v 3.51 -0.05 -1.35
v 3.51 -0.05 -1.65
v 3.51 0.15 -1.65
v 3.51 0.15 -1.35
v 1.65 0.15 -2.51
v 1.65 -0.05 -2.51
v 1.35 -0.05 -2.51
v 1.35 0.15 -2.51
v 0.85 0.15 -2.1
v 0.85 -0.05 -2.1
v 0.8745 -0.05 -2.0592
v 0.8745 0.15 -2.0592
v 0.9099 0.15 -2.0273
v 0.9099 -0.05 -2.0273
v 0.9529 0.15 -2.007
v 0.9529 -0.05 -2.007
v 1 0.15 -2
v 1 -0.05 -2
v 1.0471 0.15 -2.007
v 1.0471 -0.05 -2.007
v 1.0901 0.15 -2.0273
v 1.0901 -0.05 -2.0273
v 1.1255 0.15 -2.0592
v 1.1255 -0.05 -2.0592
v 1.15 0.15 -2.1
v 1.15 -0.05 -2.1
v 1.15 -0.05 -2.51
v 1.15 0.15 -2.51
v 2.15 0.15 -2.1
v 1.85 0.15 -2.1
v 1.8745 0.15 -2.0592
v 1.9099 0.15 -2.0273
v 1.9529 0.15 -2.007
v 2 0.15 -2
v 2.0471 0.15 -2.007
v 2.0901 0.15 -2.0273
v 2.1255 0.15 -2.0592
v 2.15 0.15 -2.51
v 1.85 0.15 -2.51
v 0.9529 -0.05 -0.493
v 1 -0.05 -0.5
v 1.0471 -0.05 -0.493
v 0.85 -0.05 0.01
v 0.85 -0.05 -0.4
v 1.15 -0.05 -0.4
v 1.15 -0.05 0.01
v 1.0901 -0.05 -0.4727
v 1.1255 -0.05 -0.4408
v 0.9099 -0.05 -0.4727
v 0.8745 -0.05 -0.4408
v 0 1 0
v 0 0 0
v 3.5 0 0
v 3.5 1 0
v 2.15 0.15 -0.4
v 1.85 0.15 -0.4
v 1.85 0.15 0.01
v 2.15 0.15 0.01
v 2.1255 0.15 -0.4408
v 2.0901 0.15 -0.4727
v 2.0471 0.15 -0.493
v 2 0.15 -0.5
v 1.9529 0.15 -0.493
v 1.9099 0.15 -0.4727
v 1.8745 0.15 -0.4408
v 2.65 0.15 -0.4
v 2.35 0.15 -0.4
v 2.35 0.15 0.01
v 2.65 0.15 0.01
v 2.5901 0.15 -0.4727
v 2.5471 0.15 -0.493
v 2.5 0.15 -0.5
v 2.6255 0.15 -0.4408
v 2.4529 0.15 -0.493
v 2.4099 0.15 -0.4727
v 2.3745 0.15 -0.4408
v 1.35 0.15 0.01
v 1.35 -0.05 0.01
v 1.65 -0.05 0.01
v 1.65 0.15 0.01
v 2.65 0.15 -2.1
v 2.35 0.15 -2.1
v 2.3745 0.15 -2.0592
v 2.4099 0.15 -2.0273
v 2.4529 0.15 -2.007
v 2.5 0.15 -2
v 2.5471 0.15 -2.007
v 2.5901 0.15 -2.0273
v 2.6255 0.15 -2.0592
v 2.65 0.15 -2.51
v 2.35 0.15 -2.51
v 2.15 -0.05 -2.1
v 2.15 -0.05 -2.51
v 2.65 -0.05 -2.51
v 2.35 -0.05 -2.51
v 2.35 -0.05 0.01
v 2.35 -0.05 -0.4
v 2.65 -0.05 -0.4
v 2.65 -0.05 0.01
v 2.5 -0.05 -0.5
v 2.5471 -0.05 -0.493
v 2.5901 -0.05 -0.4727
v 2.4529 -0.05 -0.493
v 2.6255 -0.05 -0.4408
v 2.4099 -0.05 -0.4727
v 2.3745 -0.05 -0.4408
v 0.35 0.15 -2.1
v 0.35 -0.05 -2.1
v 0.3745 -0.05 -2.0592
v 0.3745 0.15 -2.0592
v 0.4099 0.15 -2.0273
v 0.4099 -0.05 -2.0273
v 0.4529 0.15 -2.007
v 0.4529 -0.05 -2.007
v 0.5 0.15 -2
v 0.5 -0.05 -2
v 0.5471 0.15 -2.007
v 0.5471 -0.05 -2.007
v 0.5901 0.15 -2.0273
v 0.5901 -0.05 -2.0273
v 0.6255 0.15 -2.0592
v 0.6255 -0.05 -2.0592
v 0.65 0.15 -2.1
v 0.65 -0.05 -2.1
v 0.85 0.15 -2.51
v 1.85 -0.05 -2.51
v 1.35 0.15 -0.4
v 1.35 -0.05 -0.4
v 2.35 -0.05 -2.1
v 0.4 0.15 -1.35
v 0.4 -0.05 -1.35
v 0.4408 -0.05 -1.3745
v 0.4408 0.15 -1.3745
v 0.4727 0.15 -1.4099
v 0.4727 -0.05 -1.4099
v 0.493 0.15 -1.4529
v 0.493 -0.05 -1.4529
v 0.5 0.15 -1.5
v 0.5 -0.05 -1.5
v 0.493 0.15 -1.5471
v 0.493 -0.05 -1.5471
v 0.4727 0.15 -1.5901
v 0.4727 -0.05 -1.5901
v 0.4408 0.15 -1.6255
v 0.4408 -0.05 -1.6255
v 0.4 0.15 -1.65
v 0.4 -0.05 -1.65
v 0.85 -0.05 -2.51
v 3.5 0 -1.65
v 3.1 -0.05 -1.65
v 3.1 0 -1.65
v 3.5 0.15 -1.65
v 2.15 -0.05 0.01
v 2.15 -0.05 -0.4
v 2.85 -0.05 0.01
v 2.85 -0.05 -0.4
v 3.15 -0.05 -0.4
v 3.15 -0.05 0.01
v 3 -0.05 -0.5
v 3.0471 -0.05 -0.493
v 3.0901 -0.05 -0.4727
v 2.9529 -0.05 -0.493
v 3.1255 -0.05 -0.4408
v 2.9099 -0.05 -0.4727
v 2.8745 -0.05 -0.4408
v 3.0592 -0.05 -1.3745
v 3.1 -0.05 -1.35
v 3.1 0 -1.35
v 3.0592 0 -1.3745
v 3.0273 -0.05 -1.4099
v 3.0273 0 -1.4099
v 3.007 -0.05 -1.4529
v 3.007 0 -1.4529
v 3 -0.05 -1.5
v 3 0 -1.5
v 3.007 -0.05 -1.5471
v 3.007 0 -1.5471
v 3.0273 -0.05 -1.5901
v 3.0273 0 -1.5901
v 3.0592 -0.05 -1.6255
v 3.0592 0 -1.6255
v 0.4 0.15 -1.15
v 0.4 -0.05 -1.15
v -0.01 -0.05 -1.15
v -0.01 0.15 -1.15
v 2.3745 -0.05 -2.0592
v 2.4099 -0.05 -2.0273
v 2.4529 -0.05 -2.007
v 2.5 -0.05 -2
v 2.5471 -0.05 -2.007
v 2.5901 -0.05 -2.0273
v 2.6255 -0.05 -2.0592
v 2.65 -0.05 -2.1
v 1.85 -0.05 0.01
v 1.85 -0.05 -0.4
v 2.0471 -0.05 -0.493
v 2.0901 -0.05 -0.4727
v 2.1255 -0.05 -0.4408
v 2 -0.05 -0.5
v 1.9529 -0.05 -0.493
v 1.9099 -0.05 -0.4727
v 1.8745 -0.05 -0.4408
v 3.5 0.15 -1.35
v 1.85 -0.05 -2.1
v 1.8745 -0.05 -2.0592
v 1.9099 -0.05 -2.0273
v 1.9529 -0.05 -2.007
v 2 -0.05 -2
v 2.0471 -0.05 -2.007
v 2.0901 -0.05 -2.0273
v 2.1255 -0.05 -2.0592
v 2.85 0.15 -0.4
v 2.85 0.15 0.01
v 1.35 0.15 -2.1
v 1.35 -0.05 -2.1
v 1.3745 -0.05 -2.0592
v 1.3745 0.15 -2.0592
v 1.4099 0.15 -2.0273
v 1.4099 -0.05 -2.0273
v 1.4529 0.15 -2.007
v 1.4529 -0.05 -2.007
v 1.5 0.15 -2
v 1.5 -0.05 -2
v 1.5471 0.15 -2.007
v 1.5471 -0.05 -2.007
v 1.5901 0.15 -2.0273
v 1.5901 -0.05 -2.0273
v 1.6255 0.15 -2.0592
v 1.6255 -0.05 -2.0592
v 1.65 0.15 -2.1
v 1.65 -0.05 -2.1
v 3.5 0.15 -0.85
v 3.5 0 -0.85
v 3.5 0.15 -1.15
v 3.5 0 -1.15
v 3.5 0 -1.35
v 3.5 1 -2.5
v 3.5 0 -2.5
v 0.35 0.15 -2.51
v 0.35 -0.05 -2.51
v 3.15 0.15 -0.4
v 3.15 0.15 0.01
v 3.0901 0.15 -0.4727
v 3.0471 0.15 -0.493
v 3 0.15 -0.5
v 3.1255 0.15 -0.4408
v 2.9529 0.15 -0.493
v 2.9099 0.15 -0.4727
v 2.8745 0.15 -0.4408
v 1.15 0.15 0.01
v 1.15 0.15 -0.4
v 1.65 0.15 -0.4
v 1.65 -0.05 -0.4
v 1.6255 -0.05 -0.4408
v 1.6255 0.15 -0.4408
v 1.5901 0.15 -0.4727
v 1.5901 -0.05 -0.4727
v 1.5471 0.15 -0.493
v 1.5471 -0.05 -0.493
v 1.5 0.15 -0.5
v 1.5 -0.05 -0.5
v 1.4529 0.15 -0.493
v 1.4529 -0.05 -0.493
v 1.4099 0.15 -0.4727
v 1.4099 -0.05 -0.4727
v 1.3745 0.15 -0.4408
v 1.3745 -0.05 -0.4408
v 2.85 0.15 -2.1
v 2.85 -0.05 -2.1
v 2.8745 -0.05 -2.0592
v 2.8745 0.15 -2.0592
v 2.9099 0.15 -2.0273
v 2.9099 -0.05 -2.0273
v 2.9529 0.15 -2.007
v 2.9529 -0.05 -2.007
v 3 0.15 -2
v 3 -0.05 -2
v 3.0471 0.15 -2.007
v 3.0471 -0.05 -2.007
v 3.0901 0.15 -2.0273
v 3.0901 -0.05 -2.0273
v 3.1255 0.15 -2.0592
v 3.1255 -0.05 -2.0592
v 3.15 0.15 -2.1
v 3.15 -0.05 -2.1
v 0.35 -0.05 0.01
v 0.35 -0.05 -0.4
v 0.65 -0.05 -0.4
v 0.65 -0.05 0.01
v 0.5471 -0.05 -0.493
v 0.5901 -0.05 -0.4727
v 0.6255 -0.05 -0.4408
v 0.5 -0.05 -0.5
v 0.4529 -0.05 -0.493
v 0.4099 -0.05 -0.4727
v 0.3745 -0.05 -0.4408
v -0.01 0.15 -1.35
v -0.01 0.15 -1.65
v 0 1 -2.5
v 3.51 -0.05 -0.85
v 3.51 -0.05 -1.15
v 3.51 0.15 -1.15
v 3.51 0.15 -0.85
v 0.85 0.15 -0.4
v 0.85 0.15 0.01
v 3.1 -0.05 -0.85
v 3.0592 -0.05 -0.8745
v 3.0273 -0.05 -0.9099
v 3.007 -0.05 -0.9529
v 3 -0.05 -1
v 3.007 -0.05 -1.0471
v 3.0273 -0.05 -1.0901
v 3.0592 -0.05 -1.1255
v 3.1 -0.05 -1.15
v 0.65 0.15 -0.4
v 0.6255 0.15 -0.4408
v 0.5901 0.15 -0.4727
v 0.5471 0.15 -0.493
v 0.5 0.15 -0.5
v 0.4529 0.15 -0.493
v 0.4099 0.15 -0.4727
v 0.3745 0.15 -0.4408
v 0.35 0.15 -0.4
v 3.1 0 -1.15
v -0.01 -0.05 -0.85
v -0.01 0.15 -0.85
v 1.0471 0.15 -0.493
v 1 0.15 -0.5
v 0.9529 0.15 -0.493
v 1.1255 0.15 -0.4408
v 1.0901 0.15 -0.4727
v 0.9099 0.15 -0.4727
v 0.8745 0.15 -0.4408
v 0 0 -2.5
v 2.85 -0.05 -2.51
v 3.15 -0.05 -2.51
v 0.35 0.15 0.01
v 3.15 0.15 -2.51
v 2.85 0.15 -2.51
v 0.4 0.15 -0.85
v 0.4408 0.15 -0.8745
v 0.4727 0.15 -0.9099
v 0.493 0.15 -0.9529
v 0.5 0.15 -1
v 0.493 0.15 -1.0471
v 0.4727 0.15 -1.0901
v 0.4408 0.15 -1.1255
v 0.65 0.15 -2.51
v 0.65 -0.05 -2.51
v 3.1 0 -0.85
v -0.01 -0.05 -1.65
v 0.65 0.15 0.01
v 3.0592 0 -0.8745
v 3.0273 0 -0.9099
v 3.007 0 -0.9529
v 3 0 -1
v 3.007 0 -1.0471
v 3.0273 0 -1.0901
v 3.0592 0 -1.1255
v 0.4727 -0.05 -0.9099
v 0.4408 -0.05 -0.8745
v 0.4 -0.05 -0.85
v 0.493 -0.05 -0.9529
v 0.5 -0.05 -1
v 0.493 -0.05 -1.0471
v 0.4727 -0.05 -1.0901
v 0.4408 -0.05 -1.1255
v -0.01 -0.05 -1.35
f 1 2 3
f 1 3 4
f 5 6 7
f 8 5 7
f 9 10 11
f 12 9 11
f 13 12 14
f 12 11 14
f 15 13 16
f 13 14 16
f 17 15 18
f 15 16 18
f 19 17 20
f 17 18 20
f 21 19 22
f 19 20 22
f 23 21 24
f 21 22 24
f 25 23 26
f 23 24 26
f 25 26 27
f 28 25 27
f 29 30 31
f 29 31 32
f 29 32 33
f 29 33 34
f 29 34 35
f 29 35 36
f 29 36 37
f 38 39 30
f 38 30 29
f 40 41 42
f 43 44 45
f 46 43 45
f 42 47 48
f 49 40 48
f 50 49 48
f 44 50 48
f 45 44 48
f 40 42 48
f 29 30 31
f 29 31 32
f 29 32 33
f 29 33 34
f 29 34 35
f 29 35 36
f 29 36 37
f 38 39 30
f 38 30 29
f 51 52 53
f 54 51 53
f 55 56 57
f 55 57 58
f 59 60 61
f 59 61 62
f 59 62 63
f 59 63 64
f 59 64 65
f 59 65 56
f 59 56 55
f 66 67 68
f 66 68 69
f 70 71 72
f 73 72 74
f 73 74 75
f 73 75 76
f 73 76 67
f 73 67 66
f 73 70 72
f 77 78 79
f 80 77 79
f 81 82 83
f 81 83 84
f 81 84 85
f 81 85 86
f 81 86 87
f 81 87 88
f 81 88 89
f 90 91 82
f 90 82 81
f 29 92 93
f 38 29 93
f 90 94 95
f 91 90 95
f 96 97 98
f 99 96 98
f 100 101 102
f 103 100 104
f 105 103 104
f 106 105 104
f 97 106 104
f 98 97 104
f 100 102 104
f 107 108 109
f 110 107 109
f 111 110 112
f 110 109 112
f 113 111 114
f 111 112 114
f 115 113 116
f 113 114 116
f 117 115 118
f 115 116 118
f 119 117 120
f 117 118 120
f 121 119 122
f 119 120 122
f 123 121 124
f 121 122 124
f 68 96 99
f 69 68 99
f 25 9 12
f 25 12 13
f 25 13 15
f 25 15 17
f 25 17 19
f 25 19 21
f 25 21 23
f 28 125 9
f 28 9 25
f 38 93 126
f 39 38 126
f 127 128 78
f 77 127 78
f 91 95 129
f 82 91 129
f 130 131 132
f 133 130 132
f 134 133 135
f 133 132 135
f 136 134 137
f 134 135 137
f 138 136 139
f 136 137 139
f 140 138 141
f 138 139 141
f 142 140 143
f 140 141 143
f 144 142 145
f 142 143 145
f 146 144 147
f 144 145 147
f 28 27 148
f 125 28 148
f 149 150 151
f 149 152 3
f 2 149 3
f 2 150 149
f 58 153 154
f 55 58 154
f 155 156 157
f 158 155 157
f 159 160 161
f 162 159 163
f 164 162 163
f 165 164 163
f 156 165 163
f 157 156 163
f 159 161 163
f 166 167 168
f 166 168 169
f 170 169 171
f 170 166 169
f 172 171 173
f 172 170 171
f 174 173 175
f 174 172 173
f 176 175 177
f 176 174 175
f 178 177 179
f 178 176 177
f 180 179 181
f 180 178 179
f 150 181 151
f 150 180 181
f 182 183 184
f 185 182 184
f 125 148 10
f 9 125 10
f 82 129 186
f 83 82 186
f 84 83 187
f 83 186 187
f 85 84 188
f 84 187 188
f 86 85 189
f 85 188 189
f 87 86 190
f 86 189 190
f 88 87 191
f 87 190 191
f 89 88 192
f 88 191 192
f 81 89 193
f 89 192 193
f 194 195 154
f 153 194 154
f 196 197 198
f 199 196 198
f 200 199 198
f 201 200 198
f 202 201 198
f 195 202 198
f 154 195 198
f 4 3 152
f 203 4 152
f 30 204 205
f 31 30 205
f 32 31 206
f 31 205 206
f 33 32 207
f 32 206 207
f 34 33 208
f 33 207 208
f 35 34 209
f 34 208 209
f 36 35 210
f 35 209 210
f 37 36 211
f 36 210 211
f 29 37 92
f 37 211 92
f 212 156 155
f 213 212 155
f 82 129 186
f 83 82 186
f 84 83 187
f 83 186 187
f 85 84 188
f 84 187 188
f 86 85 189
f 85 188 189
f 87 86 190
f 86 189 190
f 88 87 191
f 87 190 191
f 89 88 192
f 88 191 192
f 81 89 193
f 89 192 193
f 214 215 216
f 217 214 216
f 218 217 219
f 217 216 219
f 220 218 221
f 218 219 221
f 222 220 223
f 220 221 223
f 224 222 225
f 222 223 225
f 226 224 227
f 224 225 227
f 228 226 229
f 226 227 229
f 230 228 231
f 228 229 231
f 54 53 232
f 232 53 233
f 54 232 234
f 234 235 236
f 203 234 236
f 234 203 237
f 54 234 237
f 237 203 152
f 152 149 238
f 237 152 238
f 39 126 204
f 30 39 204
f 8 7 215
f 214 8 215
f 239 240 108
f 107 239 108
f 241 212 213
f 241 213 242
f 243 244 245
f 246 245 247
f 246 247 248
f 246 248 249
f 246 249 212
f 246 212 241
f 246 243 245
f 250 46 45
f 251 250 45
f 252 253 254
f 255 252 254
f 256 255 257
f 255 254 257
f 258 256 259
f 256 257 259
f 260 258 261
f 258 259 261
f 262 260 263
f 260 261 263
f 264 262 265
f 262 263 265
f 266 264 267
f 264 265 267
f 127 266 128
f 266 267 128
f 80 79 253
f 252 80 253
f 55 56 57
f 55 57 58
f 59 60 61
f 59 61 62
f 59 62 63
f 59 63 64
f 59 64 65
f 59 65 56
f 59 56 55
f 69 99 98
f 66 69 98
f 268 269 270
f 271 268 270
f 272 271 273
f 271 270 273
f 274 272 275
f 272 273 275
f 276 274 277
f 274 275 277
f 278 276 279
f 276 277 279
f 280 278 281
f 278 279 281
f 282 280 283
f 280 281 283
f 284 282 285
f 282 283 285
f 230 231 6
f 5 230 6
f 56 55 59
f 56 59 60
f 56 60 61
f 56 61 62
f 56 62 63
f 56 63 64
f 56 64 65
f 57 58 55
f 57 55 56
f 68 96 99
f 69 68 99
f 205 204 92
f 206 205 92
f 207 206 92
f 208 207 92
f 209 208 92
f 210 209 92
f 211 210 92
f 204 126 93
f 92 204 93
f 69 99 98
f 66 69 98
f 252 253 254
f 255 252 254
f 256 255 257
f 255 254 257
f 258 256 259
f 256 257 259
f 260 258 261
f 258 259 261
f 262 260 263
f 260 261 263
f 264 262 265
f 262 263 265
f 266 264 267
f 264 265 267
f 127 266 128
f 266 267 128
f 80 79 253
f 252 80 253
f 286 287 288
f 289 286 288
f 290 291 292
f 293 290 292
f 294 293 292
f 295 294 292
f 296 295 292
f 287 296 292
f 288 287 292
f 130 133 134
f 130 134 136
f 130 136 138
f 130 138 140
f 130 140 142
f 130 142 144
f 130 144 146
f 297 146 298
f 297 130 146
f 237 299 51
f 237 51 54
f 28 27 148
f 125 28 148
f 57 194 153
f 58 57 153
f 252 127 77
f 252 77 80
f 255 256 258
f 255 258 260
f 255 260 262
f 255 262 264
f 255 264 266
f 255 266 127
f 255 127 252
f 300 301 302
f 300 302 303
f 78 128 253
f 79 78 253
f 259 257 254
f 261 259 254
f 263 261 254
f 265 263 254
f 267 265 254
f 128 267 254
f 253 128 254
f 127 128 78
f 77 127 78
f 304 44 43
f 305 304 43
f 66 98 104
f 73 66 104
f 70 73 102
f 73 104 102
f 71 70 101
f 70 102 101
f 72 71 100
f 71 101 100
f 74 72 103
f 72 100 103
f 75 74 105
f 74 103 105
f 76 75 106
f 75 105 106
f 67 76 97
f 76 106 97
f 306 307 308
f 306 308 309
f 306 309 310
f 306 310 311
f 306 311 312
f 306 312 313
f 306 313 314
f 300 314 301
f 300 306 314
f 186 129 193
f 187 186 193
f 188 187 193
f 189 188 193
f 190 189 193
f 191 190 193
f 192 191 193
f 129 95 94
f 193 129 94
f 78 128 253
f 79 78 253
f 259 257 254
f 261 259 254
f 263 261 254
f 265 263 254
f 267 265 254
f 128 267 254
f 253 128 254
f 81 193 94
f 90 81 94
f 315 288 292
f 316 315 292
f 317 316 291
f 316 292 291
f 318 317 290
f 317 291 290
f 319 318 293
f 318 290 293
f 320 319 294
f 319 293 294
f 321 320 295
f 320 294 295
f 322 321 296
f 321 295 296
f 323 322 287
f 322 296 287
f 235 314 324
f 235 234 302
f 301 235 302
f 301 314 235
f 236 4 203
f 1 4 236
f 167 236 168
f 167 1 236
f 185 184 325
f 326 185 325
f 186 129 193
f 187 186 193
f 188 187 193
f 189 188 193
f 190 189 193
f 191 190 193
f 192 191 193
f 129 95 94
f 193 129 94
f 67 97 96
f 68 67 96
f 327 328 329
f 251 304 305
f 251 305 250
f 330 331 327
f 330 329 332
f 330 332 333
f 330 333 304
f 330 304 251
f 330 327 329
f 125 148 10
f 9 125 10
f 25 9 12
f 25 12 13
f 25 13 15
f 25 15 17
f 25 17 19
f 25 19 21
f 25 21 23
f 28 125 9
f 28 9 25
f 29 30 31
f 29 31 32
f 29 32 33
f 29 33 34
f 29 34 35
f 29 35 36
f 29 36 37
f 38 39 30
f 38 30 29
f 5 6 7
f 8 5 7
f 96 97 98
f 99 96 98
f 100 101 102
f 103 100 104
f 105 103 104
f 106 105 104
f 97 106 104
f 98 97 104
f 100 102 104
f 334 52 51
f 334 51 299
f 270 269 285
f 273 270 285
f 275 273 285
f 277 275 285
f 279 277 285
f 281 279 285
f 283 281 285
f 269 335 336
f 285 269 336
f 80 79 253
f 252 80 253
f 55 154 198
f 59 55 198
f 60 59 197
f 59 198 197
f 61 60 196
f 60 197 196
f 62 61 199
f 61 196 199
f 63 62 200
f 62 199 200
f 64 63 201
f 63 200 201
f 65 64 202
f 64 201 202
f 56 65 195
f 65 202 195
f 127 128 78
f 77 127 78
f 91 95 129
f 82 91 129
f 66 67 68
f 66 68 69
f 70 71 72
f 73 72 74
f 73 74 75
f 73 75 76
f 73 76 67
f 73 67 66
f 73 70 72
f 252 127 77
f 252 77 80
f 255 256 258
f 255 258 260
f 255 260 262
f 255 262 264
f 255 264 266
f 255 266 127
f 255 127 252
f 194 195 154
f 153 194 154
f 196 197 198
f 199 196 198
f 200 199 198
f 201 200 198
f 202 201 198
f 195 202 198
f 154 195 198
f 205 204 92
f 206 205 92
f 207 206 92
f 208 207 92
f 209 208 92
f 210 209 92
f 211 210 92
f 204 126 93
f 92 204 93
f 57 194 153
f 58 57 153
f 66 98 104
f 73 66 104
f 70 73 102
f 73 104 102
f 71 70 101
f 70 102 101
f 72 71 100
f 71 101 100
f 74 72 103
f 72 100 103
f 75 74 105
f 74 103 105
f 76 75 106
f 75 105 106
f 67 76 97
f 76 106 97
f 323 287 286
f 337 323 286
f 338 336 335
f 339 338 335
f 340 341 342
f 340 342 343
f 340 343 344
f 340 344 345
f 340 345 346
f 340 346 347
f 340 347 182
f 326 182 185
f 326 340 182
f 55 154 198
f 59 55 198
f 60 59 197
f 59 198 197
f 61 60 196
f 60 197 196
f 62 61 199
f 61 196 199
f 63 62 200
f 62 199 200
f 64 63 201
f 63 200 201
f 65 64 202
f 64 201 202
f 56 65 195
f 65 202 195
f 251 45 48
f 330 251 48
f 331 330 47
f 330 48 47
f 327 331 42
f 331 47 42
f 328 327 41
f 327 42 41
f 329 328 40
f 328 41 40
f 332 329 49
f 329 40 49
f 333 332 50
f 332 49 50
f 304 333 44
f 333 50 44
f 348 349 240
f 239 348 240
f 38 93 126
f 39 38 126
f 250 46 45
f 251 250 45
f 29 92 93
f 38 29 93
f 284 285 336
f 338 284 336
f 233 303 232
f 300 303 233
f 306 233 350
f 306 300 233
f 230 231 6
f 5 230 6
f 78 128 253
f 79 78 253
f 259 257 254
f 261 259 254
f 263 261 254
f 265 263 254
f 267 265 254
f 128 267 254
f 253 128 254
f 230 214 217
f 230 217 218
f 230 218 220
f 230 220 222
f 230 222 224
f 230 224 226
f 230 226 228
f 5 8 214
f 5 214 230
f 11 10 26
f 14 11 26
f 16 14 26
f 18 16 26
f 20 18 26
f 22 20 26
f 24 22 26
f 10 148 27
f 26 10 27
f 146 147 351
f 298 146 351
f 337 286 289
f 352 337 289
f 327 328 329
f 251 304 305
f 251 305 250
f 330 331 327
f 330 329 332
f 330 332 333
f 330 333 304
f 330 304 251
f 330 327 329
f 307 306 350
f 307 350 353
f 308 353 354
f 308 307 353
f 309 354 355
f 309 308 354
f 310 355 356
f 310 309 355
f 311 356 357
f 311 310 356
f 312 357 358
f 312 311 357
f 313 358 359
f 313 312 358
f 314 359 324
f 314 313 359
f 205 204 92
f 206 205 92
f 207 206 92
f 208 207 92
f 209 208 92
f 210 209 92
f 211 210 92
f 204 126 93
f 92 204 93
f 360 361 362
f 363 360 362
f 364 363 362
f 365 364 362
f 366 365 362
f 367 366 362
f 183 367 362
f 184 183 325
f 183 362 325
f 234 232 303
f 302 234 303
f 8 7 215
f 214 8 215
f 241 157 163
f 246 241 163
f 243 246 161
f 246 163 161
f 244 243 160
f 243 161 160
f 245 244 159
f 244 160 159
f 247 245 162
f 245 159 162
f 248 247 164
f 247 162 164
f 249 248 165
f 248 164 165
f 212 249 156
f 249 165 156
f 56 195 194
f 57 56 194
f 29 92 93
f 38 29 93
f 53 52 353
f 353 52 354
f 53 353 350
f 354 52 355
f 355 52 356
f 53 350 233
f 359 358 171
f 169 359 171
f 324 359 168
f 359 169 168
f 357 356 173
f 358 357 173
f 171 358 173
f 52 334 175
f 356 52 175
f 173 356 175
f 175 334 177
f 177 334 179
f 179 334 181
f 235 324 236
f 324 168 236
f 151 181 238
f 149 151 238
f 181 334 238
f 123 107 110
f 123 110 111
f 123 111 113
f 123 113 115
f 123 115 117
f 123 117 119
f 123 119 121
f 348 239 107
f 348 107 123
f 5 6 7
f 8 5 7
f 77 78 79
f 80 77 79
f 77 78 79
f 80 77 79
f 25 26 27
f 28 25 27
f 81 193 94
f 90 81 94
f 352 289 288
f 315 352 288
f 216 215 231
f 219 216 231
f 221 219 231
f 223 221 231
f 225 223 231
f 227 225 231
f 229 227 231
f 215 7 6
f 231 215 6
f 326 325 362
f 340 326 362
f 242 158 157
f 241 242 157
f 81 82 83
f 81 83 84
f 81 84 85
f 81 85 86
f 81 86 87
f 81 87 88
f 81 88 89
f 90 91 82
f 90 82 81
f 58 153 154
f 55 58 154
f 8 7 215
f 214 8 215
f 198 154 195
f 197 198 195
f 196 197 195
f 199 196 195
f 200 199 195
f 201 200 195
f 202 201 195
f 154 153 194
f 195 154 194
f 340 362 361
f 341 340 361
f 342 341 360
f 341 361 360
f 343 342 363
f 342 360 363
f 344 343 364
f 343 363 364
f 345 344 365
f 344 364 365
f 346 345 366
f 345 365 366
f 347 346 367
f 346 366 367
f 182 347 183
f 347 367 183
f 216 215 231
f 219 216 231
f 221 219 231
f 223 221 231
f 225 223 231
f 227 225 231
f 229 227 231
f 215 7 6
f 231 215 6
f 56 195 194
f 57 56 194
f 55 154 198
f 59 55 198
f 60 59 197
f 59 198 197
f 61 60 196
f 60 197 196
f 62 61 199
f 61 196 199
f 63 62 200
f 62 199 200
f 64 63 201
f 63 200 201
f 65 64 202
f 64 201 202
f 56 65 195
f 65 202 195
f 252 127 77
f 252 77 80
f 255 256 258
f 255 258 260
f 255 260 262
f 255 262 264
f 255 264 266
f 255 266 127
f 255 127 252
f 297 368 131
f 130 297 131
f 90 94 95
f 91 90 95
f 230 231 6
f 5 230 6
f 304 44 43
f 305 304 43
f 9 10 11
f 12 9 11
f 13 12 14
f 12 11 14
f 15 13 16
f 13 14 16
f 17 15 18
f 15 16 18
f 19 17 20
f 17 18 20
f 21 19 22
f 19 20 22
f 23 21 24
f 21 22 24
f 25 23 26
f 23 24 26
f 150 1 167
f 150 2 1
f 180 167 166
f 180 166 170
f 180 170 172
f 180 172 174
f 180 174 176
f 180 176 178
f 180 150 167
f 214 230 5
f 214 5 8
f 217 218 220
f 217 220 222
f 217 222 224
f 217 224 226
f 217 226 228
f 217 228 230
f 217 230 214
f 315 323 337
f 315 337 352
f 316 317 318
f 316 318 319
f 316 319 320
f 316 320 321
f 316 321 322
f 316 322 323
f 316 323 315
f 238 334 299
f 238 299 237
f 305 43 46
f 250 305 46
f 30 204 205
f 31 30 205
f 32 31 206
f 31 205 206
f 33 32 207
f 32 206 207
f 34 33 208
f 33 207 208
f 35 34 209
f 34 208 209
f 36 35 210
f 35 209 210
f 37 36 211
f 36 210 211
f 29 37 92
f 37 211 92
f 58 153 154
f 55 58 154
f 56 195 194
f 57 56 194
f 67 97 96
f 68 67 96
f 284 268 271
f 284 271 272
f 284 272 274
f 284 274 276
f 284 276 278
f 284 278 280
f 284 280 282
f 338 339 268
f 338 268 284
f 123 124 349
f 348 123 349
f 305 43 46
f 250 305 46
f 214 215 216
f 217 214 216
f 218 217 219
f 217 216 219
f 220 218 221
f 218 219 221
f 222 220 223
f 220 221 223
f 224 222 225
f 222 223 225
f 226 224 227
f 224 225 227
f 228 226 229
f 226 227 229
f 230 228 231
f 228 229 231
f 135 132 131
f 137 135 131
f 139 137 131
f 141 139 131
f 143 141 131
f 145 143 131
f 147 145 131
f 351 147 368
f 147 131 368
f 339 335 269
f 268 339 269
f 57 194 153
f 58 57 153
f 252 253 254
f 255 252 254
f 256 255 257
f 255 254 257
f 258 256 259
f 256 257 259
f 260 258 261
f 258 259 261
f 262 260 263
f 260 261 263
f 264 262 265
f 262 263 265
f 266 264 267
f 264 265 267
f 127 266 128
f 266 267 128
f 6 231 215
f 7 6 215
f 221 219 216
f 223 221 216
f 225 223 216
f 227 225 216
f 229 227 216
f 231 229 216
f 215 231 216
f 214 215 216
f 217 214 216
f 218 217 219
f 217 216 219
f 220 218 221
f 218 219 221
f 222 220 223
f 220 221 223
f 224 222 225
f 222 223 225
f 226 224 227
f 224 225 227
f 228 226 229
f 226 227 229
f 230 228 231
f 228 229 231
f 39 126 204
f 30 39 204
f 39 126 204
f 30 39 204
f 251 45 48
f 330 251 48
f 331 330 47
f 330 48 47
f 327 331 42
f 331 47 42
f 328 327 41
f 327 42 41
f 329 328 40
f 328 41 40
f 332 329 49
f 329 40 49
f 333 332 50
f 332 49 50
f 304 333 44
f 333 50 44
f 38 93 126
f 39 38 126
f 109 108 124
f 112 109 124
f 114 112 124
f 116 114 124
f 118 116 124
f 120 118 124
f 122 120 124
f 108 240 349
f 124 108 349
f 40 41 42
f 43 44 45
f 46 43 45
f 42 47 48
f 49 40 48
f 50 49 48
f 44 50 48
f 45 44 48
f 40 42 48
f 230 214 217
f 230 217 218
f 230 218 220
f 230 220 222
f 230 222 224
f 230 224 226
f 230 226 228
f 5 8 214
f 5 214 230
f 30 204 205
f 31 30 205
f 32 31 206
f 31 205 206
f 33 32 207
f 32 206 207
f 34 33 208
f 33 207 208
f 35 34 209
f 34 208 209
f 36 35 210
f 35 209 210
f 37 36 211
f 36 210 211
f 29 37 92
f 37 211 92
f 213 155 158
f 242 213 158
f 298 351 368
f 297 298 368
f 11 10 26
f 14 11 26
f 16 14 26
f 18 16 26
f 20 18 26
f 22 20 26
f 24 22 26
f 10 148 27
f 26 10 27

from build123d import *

# Parameters (mm, degrees)
SKETCH1_W            = 3.5
SKETCH1_H            = 2.5
BOSS_EXTRUDE1_DEPTH  = 1
BOSS_EXTRUDE2_START  = 0.05
BOSS_EXTRUDE2_DEPTH  = 0.2
LPATTERN1_START      = -0.05
LPATTERN1_DEPTH      = 0.2
LPATTERN1_2_DEPTH    = 0.2
LPATTERN1_3_DEPTH    = 0.2
LPATTERN1_4_DEPTH    = 0.2
LPATTERN1_5_DEPTH    = 0.2
LPATTERN1_6_DEPTH    = 0.2
LPATTERN1_7_DEPTH    = 0.2
LPATTERN1_8_DEPTH    = 0.2
LPATTERN1_9_DEPTH    = 0.2
LPATTERN1_10_DEPTH   = 0.2
LPATTERN1_11_DEPTH   = 0.2
BOSS_EXTRUDE3_START  = 0.05
BOSS_EXTRUDE3_DEPTH  = 0.2
LPATTERN2_START      = -0.05
LPATTERN2_DEPTH      = 0.2
LPATTERN2_2_DEPTH    = 0.2
LPATTERN2_3_DEPTH    = 0.2
LPATTERN2_4_DEPTH    = 0.2
LPATTERN2_5_DEPTH    = 0.2
LPATTERN2_6_DEPTH    = 0.2
LPATTERN2_7_DEPTH    = 0.2
LPATTERN2_8_DEPTH    = 0.2
LPATTERN2_9_DEPTH    = 0.2
LPATTERN2_10_DEPTH   = 0.2
LPATTERN2_11_DEPTH   = 0.2
BOSS_EXTRUDE4_START  = 0.05
BOSS_EXTRUDE4_DEPTH  = 0.2
LPATTERN3_COUNT      = 2
LPATTERN3_PITCH      = 0.5
MIRROR7_START        = 0.05
MIRROR7_COPY_1_DEPTH = 0.2


# Read off the part's stored shape, not the designer's step: LPattern1, LPattern2
with BuildPart() as part:
    # Sketch1 → Boss-Extrude1 (new body)
    with BuildSketch(Plane(origin=(0, 0, 0), x_dir=(1, 0, 0), z_dir=(0, 1, 0))):
        with Locations((1.75, 1.25)):
            Rectangle(SKETCH1_W, SKETCH1_H)
    extrude(amount=BOSS_EXTRUDE1_DEPTH)


with BuildPart() as body_2:
    # Sketch2 → Boss-Extrude2 (new body)
    with BuildSketch(Plane.XZ.offset(BOSS_EXTRUDE2_START)):
        with BuildLine():
            Line((2.15, 0.01), (2.15, -0.4))
            ThreePointArc((2.15, -0.4), (2, -0.5), (1.85, -0.4))
            Line((1.85, -0.4), (1.85, 0.01))
            Line((1.85, 0.01), (2.15, 0.01))
        make_face()
    extrude(amount=-BOSS_EXTRUDE2_DEPTH)


with BuildPart() as body_3:
    # LPattern1 outline → LPattern1 (new body)
    with BuildSketch(Plane(origin=(0, 0, 0), x_dir=(1, 0, 0), z_dir=(0, 1, 0)).offset(LPATTERN1_START)):
        with BuildLine():
            ThreePointArc((1.65, 0.4), (1.5, 0.5), (1.35, 0.4))
            Line((1.35, 0.4), (1.35, -0.01))
            Line((1.35, -0.01), (1.65, -0.01))
            Line((1.65, -0.01), (1.65, 0.4))
        make_face()
    extrude(amount=LPATTERN1_DEPTH)


with BuildPart() as body_4:
    # LPattern1 2 outline → LPattern1 2 (new body)
    with BuildSketch(Plane(origin=(0, 0, 0), x_dir=(1, 0, 0), z_dir=(0, 1, 0)).offset(LPATTERN1_START)):
        with BuildLine():
            ThreePointArc((2.65, 0.4), (2.5, 0.5), (2.35, 0.4))
            Line((2.35, 0.4), (2.35, -0.01))
            Line((2.35, -0.01), (2.65, -0.01))
            Line((2.65, -0.01), (2.65, 0.4))
        make_face()
    extrude(amount=LPATTERN1_2_DEPTH)


with BuildPart() as body_5:
    # LPattern1 3 outline → LPattern1 3 (new body)
    with BuildSketch(Plane(origin=(0, 0, 0), x_dir=(1, 0, 0), z_dir=(0, 1, 0)).offset(LPATTERN1_START)):
        with BuildLine():
            ThreePointArc((3.15, 0.4), (3, 0.5), (2.85, 0.4))
            Line((2.85, 0.4), (2.85, -0.01))
            Line((2.85, -0.01), (3.15, -0.01))
            Line((3.15, -0.01), (3.15, 0.4))
        make_face()
    extrude(amount=LPATTERN1_3_DEPTH)


with BuildPart() as body_6:
    # LPattern1 4 outline → LPattern1 4 (new body)
    with BuildSketch(Plane(origin=(0, 0, 0), x_dir=(1, 0, 0), z_dir=(0, 1, 0)).offset(LPATTERN1_START)):
        with BuildLine():
            ThreePointArc((1.15, 0.4), (1, 0.5), (0.85, 0.4))
            Line((0.85, 0.4), (0.85, -0.01))
            Line((0.85, -0.01), (1.15, -0.01))
            Line((1.15, -0.01), (1.15, 0.4))
        make_face()
    extrude(amount=LPATTERN1_4_DEPTH)


with BuildPart() as body_7:
    # LPattern1 5 outline → LPattern1 5 (new body)
    with BuildSketch(Plane(origin=(0, 0, 0), x_dir=(1, 0, 0), z_dir=(0, 1, 0)).offset(LPATTERN1_START)):
        with BuildLine():
            ThreePointArc((1.65, 0.4), (1.5, 0.5), (1.35, 0.4))
            Line((1.35, 0.4), (1.35, -0.01))
            Line((1.35, -0.01), (1.65, -0.01))
            Line((1.65, -0.01), (1.65, 0.4))
        make_face()
    extrude(amount=LPATTERN1_5_DEPTH)


with BuildPart() as body_8:
    # LPattern1 6 outline → LPattern1 6 (new body)
    with BuildSketch(Plane(origin=(0, 0, 0), x_dir=(1, 0, 0), z_dir=(0, 1, 0)).offset(LPATTERN1_START)):
        with BuildLine():
            ThreePointArc((2.15, 0.4), (2, 0.5), (1.85, 0.4))
            Line((1.85, 0.4), (1.85, -0.01))
            Line((1.85, -0.01), (2.15, -0.01))
            Line((2.15, -0.01), (2.15, 0.4))
        make_face()
    extrude(amount=LPATTERN1_6_DEPTH)


with BuildPart() as body_9:
    # LPattern1 7 outline → LPattern1 7 (new body)
    with BuildSketch(Plane(origin=(0, 0, 0), x_dir=(1, 0, 0), z_dir=(0, 1, 0)).offset(LPATTERN1_START)):
        with BuildLine():
            ThreePointArc((2.65, 0.4), (2.5, 0.5), (2.35, 0.4))
            Line((2.35, 0.4), (2.35, -0.01))
            Line((2.35, -0.01), (2.65, -0.01))
            Line((2.65, -0.01), (2.65, 0.4))
        make_face()
    extrude(amount=LPATTERN1_7_DEPTH)


with BuildPart() as body_10:
    # LPattern1 8 outline → LPattern1 8 (new body)
    with BuildSketch(Plane(origin=(0, 0, 0), x_dir=(1, 0, 0), z_dir=(0, 1, 0)).offset(LPATTERN1_START)):
        with BuildLine():
            ThreePointArc((0.65, 0.4), (0.5, 0.5), (0.35, 0.4))
            Line((0.35, 0.4), (0.35, -0.01))
            Line((0.35, -0.01), (0.65, -0.01))
            Line((0.65, -0.01), (0.65, 0.4))
        make_face()
    extrude(amount=LPATTERN1_8_DEPTH)


with BuildPart() as body_11:
    # LPattern1 9 outline → LPattern1 9 (new body)
    with BuildSketch(Plane(origin=(0, 0, 0), x_dir=(1, 0, 0), z_dir=(0, 1, 0)).offset(LPATTERN1_START)):
        with BuildLine():
            ThreePointArc((1.15, 0.4), (1, 0.5), (0.85, 0.4))
            Line((0.85, 0.4), (0.85, -0.01))
            Line((0.85, -0.01), (1.15, -0.01))
            Line((1.15, -0.01), (1.15, 0.4))
        make_face()
    extrude(amount=LPATTERN1_9_DEPTH)


with BuildPart() as body_12:
    # LPattern1 10 outline → LPattern1 10 (new body)
    with BuildSketch(Plane(origin=(0, 0, 0), x_dir=(1, 0, 0), z_dir=(0, 1, 0)).offset(LPATTERN1_START)):
        with BuildLine():
            ThreePointArc((1.65, 0.4), (1.5, 0.5), (1.35, 0.4))
            Line((1.35, 0.4), (1.35, -0.01))
            Line((1.35, -0.01), (1.65, -0.01))
            Line((1.65, -0.01), (1.65, 0.4))
        make_face()
    extrude(amount=LPATTERN1_10_DEPTH)


with BuildPart() as body_13:
    # LPattern1 11 outline → LPattern1 11 (new body)
    with BuildSketch(Plane(origin=(0, 0, 0), x_dir=(1, 0, 0), z_dir=(0, 1, 0)).offset(LPATTERN1_START)):
        with BuildLine():
            ThreePointArc((2.15, 0.4), (2, 0.5), (1.85, 0.4))
            Line((1.85, 0.4), (1.85, -0.01))
            Line((1.85, -0.01), (2.15, -0.01))
            Line((2.15, -0.01), (2.15, 0.4))
        make_face()
    extrude(amount=LPATTERN1_11_DEPTH)


with BuildPart() as body_14:
    # Sketch4 → Boss-Extrude3 (new body)
    with BuildSketch(Plane.XZ.offset(BOSS_EXTRUDE3_START)):
        with BuildLine():
            Line((1.35, -2.51), (1.35, -2.1))
            ThreePointArc((1.35, -2.1), (1.5, -2), (1.65, -2.1))
            Line((1.65, -2.1), (1.65, -2.51))
            Line((1.65, -2.51), (1.35, -2.51))
        make_face()
    extrude(amount=-BOSS_EXTRUDE3_DEPTH)


with BuildPart() as body_15:
    # LPattern2 outline → LPattern2 (new body)
    with BuildSketch(Plane(origin=(0, 0, 0), x_dir=(1, 0, 0), z_dir=(0, 1, 0)).offset(LPATTERN2_START)):
        with BuildLine():
            ThreePointArc((1.85, 2.1), (2, 2), (2.15, 2.1))
            Line((2.15, 2.1), (2.15, 2.51))
            Line((2.15, 2.51), (1.85, 2.51))
            Line((1.85, 2.51), (1.85, 2.1))
        make_face()
    extrude(amount=LPATTERN2_DEPTH)


with BuildPart() as body_16:
    # LPattern2 2 outline → LPattern2 2 (new body)
    with BuildSketch(Plane(origin=(0, 0, 0), x_dir=(1, 0, 0), z_dir=(0, 1, 0)).offset(LPATTERN2_START)):
        with BuildLine():
            ThreePointArc((0.85, 2.1), (1, 2), (1.15, 2.1))
            Line((1.15, 2.1), (1.15, 2.51))
            Line((1.15, 2.51), (0.85, 2.51))
            Line((0.85, 2.51), (0.85, 2.1))
        make_face()
    extrude(amount=LPATTERN2_2_DEPTH)


with BuildPart() as body_17:
    # LPattern2 3 outline → LPattern2 3 (new body)
    with BuildSketch(Plane(origin=(0, 0, 0), x_dir=(1, 0, 0), z_dir=(0, 1, 0)).offset(LPATTERN2_START)):
        with BuildLine():
            ThreePointArc((0.35, 2.1), (0.5, 2), (0.65, 2.1))
            Line((0.65, 2.1), (0.65, 2.51))
            Line((0.65, 2.51), (0.35, 2.51))
            Line((0.35, 2.51), (0.35, 2.1))
        make_face()
    extrude(amount=LPATTERN2_3_DEPTH)


with BuildPart() as body_18:
    # LPattern2 4 outline → LPattern2 4 (new body)
    with BuildSketch(Plane(origin=(0, 0, 0), x_dir=(1, 0, 0), z_dir=(0, 1, 0)).offset(LPATTERN2_START)):
        with BuildLine():
            ThreePointArc((2.35, 2.1), (2.5, 2), (2.65, 2.1))
            Line((2.65, 2.1), (2.65, 2.51))
            Line((2.65, 2.51), (2.35, 2.51))
            Line((2.35, 2.51), (2.35, 2.1))
        make_face()
    extrude(amount=LPATTERN2_4_DEPTH)


with BuildPart() as body_19:
    # LPattern2 5 outline → LPattern2 5 (new body)
    with BuildSketch(Plane(origin=(0, 0, 0), x_dir=(1, 0, 0), z_dir=(0, 1, 0)).offset(LPATTERN2_START)):
        with BuildLine():
            ThreePointArc((1.85, 2.1), (2, 2), (2.15, 2.1))
            Line((2.15, 2.1), (2.15, 2.51))
            Line((2.15, 2.51), (1.85, 2.51))
            Line((1.85, 2.51), (1.85, 2.1))
        make_face()
    extrude(amount=LPATTERN2_5_DEPTH)


with BuildPart() as body_20:
    # LPattern2 6 outline → LPattern2 6 (new body)
    with BuildSketch(Plane(origin=(0, 0, 0), x_dir=(1, 0, 0), z_dir=(0, 1, 0)).offset(LPATTERN2_START)):
        with BuildLine():
            ThreePointArc((1.35, 2.1), (1.5, 2), (1.65, 2.1))
            Line((1.65, 2.1), (1.65, 2.51))
            Line((1.65, 2.51), (1.35, 2.51))
            Line((1.35, 2.51), (1.35, 2.1))
        make_face()
    extrude(amount=LPATTERN2_6_DEPTH)


with BuildPart() as body_21:
    # LPattern2 7 outline → LPattern2 7 (new body)
    with BuildSketch(Plane(origin=(0, 0, 0), x_dir=(1, 0, 0), z_dir=(0, 1, 0)).offset(LPATTERN2_START)):
        with BuildLine():
            ThreePointArc((0.85, 2.1), (1, 2), (1.15, 2.1))
            Line((1.15, 2.1), (1.15, 2.51))
            Line((1.15, 2.51), (0.85, 2.51))
            Line((0.85, 2.51), (0.85, 2.1))
        make_face()
    extrude(amount=LPATTERN2_7_DEPTH)


with BuildPart() as body_22:
    # LPattern2 8 outline → LPattern2 8 (new body)
    with BuildSketch(Plane(origin=(0, 0, 0), x_dir=(1, 0, 0), z_dir=(0, 1, 0)).offset(LPATTERN2_START)):
        with BuildLine():
            ThreePointArc((2.85, 2.1), (3, 2), (3.15, 2.1))
            Line((3.15, 2.1), (3.15, 2.51))
            Line((3.15, 2.51), (2.85, 2.51))
            Line((2.85, 2.51), (2.85, 2.1))
        make_face()
    extrude(amount=LPATTERN2_8_DEPTH)


with BuildPart() as body_23:
    # LPattern2 9 outline → LPattern2 9 (new body)
    with BuildSketch(Plane(origin=(0, 0, 0), x_dir=(1, 0, 0), z_dir=(0, 1, 0)).offset(LPATTERN2_START)):
        with BuildLine():
            ThreePointArc((2.35, 2.1), (2.5, 2), (2.65, 2.1))
            Line((2.65, 2.1), (2.65, 2.51))
            Line((2.65, 2.51), (2.35, 2.51))
            Line((2.35, 2.51), (2.35, 2.1))
        make_face()
    extrude(amount=LPATTERN2_9_DEPTH)


with BuildPart() as body_24:
    # LPattern2 10 outline → LPattern2 10 (new body)
    with BuildSketch(Plane(origin=(0, 0, 0), x_dir=(1, 0, 0), z_dir=(0, 1, 0)).offset(LPATTERN2_START)):
        with BuildLine():
            ThreePointArc((1.85, 2.1), (2, 2), (2.15, 2.1))
            Line((2.15, 2.1), (2.15, 2.51))
            Line((2.15, 2.51), (1.85, 2.51))
            Line((1.85, 2.51), (1.85, 2.1))
        make_face()
    extrude(amount=LPATTERN2_10_DEPTH)


with BuildPart() as body_25:
    # LPattern2 11 outline → LPattern2 11 (new body)
    with BuildSketch(Plane(origin=(0, 0, 0), x_dir=(1, 0, 0), z_dir=(0, 1, 0)).offset(LPATTERN2_START)):
        with BuildLine():
            ThreePointArc((1.35, 2.1), (1.5, 2), (1.65, 2.1))
            Line((1.65, 2.1), (1.65, 2.51))
            Line((1.65, 2.51), (1.35, 2.51))
            Line((1.35, 2.51), (1.35, 2.1))
        make_face()
    extrude(amount=LPATTERN2_11_DEPTH)


with BuildPart() as body_26:
    # Sketch5 → Boss-Extrude4 (new body)
    with BuildSketch(Plane.XZ.offset(BOSS_EXTRUDE4_START)):
        with BuildLine():
            Line((-0.01, -0.85), (0.4, -0.85))
            ThreePointArc((0.4, -0.85), (0.5, -1), (0.4, -1.15))
            Line((0.4, -1.15), (-0.01, -1.15))
            Line((-0.01, -1.15), (-0.01, -0.85))
        make_face()
    boss_extrude4 = extrude(amount=-BOSS_EXTRUDE4_DEPTH)


with BuildPart() as lpattern3_1:
    # LPattern3: Boss-Extrude4 ×2
    with Locations(*[(0, 0, -i * LPATTERN3_PITCH) for i in range(1, LPATTERN3_COUNT)]):
        add(boss_extrude4)


with BuildPart() as part_1:
    add(part.part)

    # Mirror7: Boss-Extrude4 across plane
    add(boss_extrude4.mirror(Plane(origin=(1.75, 0, 0), x_dir=(0, 0, 1), z_dir=(1, 0, 0))))

    # Mirror7 copy 1 sketch → Mirror7 copy 1 (add)
    with BuildSketch(Plane(origin=(3.5, 0, -0.5), x_dir=(-1, 0, 0), z_dir=(0, -1, 0)).offset(MIRROR7_START)):
        with BuildLine():
            Line((-0.01, 0.85), (0.4, 0.85))
            ThreePointArc((0.4, 0.85), (0.5, 1), (0.4, 1.15))
            Line((0.4, 1.15), (-0.01, 1.15))
            Line((-0.01, 1.15), (-0.01, 0.85))
        make_face()
    extrude(amount=-MIRROR7_COPY_1_DEPTH)


solid = Compound([body_2.part, body_3.part, body_4.part, body_5.part, body_6.part, body_7.part, body_8.part, body_9.part, body_10.part, body_11.part, body_12.part, body_13.part, body_14.part, body_15.part, body_16.part, body_17.part, body_18.part, body_19.part, body_20.part, body_21.part, body_22.part, body_23.part, body_24.part, body_25.part, body_26.part, lpattern3_1.part, part_1.part])
